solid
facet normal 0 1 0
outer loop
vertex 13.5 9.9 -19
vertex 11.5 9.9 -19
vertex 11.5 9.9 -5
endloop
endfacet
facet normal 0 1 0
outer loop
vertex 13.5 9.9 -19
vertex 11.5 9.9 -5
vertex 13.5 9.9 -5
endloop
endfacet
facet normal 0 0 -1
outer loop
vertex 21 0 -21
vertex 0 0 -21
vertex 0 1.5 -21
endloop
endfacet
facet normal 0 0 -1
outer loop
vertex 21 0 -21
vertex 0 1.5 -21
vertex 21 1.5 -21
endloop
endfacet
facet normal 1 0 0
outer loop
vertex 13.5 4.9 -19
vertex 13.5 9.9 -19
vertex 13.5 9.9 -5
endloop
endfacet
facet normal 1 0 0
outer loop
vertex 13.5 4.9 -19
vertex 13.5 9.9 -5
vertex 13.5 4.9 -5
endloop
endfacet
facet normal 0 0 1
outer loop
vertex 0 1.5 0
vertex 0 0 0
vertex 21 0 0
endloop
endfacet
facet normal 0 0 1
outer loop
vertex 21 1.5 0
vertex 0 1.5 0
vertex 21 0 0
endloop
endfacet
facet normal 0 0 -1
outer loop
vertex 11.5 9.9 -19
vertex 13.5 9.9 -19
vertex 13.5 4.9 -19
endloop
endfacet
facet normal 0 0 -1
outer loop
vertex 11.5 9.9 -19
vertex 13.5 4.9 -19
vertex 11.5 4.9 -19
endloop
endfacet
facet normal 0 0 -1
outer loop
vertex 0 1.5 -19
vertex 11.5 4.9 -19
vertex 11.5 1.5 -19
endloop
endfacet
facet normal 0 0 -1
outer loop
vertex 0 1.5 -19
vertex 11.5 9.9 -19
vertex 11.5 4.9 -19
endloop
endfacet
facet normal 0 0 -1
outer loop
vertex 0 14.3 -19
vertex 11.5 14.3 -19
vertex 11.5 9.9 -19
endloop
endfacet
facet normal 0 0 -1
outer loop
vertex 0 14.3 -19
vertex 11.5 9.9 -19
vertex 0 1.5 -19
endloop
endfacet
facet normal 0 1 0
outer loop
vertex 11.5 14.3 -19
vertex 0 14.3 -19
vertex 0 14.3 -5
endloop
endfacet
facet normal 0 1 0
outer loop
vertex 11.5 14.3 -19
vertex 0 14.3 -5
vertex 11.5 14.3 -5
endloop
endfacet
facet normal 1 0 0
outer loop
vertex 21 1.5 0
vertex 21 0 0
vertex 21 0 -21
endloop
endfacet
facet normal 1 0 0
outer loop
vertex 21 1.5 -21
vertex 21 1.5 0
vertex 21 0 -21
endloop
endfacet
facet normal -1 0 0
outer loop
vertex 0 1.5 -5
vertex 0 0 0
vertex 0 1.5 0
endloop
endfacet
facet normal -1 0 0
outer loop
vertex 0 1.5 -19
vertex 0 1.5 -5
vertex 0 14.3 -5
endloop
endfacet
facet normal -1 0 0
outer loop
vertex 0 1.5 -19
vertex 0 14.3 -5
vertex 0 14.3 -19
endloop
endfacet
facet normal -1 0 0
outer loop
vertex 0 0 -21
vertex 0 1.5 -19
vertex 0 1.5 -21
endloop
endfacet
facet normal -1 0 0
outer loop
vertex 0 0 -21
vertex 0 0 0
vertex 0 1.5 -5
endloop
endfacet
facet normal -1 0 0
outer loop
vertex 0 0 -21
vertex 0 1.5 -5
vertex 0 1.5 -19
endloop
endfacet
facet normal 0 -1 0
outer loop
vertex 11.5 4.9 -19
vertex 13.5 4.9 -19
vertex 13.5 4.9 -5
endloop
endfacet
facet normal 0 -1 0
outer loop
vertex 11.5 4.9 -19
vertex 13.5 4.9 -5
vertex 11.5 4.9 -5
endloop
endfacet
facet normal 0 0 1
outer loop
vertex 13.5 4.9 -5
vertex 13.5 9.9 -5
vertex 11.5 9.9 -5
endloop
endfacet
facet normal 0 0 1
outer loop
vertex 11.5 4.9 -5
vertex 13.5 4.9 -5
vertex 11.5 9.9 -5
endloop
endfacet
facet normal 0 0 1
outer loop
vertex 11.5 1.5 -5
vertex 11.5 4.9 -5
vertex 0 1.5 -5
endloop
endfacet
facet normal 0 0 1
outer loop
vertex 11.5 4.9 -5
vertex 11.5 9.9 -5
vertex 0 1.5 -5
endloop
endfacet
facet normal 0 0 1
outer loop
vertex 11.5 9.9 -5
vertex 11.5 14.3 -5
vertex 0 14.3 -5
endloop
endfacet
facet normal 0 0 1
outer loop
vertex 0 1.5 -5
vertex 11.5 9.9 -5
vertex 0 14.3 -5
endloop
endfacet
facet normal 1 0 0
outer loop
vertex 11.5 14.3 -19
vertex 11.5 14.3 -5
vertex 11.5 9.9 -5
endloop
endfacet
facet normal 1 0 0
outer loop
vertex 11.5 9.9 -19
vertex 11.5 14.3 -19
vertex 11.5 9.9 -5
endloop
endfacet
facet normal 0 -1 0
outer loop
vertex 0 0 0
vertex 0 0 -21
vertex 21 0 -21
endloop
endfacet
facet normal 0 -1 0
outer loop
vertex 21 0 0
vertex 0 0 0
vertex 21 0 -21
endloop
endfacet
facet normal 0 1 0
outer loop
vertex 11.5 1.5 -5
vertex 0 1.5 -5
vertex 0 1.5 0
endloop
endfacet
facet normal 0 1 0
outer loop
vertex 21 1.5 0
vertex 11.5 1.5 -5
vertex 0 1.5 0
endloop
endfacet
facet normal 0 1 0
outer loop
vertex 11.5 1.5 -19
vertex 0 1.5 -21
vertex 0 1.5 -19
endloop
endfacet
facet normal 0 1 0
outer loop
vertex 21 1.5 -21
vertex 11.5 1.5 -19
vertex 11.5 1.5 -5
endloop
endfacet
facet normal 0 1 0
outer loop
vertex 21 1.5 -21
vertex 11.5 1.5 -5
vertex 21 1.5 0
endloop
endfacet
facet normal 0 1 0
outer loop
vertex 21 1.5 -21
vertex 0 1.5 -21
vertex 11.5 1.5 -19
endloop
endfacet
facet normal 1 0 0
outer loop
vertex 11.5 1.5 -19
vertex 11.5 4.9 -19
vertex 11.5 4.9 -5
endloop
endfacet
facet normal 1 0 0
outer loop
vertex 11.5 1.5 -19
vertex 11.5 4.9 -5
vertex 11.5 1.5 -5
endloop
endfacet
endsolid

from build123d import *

# Parameters (mm, degrees)
SKETCH1_W           = 21
SKETCH1_H           = 21
BOSS_EXTRUDE1_DEPTH = 1.5
BOSS_EXTRUDE3_DEPTH = 14


with BuildPart() as part:
    # Sketch1 → Boss-Extrude1 (new body)
    with BuildSketch(Plane(origin=(0, 0, 0), x_dir=(1, 0, 0), z_dir=(0, 1, 0))):
        with Locations((10.5, 10.5)):
            Rectangle(SKETCH1_W, SKETCH1_H)
    extrude(amount=BOSS_EXTRUDE1_DEPTH)

    # Sketch3 → Boss-Extrude3 (add)
    with BuildSketch(Plane(origin=(0, 0, -19), x_dir=(-1, 0, 0), z_dir=(0, 0, -1))):
        Polygon((0, 1.5), (0, 14.3), (-11.5, 14.3), (-11.5, 9.9), (-13.5, 9.9), (-13.5, 4.9), (-11.5, 4.9), (-11.5, 1.5), align=None)
    extrude(amount=-BOSS_EXTRUDE3_DEPTH)


solid = part.part
